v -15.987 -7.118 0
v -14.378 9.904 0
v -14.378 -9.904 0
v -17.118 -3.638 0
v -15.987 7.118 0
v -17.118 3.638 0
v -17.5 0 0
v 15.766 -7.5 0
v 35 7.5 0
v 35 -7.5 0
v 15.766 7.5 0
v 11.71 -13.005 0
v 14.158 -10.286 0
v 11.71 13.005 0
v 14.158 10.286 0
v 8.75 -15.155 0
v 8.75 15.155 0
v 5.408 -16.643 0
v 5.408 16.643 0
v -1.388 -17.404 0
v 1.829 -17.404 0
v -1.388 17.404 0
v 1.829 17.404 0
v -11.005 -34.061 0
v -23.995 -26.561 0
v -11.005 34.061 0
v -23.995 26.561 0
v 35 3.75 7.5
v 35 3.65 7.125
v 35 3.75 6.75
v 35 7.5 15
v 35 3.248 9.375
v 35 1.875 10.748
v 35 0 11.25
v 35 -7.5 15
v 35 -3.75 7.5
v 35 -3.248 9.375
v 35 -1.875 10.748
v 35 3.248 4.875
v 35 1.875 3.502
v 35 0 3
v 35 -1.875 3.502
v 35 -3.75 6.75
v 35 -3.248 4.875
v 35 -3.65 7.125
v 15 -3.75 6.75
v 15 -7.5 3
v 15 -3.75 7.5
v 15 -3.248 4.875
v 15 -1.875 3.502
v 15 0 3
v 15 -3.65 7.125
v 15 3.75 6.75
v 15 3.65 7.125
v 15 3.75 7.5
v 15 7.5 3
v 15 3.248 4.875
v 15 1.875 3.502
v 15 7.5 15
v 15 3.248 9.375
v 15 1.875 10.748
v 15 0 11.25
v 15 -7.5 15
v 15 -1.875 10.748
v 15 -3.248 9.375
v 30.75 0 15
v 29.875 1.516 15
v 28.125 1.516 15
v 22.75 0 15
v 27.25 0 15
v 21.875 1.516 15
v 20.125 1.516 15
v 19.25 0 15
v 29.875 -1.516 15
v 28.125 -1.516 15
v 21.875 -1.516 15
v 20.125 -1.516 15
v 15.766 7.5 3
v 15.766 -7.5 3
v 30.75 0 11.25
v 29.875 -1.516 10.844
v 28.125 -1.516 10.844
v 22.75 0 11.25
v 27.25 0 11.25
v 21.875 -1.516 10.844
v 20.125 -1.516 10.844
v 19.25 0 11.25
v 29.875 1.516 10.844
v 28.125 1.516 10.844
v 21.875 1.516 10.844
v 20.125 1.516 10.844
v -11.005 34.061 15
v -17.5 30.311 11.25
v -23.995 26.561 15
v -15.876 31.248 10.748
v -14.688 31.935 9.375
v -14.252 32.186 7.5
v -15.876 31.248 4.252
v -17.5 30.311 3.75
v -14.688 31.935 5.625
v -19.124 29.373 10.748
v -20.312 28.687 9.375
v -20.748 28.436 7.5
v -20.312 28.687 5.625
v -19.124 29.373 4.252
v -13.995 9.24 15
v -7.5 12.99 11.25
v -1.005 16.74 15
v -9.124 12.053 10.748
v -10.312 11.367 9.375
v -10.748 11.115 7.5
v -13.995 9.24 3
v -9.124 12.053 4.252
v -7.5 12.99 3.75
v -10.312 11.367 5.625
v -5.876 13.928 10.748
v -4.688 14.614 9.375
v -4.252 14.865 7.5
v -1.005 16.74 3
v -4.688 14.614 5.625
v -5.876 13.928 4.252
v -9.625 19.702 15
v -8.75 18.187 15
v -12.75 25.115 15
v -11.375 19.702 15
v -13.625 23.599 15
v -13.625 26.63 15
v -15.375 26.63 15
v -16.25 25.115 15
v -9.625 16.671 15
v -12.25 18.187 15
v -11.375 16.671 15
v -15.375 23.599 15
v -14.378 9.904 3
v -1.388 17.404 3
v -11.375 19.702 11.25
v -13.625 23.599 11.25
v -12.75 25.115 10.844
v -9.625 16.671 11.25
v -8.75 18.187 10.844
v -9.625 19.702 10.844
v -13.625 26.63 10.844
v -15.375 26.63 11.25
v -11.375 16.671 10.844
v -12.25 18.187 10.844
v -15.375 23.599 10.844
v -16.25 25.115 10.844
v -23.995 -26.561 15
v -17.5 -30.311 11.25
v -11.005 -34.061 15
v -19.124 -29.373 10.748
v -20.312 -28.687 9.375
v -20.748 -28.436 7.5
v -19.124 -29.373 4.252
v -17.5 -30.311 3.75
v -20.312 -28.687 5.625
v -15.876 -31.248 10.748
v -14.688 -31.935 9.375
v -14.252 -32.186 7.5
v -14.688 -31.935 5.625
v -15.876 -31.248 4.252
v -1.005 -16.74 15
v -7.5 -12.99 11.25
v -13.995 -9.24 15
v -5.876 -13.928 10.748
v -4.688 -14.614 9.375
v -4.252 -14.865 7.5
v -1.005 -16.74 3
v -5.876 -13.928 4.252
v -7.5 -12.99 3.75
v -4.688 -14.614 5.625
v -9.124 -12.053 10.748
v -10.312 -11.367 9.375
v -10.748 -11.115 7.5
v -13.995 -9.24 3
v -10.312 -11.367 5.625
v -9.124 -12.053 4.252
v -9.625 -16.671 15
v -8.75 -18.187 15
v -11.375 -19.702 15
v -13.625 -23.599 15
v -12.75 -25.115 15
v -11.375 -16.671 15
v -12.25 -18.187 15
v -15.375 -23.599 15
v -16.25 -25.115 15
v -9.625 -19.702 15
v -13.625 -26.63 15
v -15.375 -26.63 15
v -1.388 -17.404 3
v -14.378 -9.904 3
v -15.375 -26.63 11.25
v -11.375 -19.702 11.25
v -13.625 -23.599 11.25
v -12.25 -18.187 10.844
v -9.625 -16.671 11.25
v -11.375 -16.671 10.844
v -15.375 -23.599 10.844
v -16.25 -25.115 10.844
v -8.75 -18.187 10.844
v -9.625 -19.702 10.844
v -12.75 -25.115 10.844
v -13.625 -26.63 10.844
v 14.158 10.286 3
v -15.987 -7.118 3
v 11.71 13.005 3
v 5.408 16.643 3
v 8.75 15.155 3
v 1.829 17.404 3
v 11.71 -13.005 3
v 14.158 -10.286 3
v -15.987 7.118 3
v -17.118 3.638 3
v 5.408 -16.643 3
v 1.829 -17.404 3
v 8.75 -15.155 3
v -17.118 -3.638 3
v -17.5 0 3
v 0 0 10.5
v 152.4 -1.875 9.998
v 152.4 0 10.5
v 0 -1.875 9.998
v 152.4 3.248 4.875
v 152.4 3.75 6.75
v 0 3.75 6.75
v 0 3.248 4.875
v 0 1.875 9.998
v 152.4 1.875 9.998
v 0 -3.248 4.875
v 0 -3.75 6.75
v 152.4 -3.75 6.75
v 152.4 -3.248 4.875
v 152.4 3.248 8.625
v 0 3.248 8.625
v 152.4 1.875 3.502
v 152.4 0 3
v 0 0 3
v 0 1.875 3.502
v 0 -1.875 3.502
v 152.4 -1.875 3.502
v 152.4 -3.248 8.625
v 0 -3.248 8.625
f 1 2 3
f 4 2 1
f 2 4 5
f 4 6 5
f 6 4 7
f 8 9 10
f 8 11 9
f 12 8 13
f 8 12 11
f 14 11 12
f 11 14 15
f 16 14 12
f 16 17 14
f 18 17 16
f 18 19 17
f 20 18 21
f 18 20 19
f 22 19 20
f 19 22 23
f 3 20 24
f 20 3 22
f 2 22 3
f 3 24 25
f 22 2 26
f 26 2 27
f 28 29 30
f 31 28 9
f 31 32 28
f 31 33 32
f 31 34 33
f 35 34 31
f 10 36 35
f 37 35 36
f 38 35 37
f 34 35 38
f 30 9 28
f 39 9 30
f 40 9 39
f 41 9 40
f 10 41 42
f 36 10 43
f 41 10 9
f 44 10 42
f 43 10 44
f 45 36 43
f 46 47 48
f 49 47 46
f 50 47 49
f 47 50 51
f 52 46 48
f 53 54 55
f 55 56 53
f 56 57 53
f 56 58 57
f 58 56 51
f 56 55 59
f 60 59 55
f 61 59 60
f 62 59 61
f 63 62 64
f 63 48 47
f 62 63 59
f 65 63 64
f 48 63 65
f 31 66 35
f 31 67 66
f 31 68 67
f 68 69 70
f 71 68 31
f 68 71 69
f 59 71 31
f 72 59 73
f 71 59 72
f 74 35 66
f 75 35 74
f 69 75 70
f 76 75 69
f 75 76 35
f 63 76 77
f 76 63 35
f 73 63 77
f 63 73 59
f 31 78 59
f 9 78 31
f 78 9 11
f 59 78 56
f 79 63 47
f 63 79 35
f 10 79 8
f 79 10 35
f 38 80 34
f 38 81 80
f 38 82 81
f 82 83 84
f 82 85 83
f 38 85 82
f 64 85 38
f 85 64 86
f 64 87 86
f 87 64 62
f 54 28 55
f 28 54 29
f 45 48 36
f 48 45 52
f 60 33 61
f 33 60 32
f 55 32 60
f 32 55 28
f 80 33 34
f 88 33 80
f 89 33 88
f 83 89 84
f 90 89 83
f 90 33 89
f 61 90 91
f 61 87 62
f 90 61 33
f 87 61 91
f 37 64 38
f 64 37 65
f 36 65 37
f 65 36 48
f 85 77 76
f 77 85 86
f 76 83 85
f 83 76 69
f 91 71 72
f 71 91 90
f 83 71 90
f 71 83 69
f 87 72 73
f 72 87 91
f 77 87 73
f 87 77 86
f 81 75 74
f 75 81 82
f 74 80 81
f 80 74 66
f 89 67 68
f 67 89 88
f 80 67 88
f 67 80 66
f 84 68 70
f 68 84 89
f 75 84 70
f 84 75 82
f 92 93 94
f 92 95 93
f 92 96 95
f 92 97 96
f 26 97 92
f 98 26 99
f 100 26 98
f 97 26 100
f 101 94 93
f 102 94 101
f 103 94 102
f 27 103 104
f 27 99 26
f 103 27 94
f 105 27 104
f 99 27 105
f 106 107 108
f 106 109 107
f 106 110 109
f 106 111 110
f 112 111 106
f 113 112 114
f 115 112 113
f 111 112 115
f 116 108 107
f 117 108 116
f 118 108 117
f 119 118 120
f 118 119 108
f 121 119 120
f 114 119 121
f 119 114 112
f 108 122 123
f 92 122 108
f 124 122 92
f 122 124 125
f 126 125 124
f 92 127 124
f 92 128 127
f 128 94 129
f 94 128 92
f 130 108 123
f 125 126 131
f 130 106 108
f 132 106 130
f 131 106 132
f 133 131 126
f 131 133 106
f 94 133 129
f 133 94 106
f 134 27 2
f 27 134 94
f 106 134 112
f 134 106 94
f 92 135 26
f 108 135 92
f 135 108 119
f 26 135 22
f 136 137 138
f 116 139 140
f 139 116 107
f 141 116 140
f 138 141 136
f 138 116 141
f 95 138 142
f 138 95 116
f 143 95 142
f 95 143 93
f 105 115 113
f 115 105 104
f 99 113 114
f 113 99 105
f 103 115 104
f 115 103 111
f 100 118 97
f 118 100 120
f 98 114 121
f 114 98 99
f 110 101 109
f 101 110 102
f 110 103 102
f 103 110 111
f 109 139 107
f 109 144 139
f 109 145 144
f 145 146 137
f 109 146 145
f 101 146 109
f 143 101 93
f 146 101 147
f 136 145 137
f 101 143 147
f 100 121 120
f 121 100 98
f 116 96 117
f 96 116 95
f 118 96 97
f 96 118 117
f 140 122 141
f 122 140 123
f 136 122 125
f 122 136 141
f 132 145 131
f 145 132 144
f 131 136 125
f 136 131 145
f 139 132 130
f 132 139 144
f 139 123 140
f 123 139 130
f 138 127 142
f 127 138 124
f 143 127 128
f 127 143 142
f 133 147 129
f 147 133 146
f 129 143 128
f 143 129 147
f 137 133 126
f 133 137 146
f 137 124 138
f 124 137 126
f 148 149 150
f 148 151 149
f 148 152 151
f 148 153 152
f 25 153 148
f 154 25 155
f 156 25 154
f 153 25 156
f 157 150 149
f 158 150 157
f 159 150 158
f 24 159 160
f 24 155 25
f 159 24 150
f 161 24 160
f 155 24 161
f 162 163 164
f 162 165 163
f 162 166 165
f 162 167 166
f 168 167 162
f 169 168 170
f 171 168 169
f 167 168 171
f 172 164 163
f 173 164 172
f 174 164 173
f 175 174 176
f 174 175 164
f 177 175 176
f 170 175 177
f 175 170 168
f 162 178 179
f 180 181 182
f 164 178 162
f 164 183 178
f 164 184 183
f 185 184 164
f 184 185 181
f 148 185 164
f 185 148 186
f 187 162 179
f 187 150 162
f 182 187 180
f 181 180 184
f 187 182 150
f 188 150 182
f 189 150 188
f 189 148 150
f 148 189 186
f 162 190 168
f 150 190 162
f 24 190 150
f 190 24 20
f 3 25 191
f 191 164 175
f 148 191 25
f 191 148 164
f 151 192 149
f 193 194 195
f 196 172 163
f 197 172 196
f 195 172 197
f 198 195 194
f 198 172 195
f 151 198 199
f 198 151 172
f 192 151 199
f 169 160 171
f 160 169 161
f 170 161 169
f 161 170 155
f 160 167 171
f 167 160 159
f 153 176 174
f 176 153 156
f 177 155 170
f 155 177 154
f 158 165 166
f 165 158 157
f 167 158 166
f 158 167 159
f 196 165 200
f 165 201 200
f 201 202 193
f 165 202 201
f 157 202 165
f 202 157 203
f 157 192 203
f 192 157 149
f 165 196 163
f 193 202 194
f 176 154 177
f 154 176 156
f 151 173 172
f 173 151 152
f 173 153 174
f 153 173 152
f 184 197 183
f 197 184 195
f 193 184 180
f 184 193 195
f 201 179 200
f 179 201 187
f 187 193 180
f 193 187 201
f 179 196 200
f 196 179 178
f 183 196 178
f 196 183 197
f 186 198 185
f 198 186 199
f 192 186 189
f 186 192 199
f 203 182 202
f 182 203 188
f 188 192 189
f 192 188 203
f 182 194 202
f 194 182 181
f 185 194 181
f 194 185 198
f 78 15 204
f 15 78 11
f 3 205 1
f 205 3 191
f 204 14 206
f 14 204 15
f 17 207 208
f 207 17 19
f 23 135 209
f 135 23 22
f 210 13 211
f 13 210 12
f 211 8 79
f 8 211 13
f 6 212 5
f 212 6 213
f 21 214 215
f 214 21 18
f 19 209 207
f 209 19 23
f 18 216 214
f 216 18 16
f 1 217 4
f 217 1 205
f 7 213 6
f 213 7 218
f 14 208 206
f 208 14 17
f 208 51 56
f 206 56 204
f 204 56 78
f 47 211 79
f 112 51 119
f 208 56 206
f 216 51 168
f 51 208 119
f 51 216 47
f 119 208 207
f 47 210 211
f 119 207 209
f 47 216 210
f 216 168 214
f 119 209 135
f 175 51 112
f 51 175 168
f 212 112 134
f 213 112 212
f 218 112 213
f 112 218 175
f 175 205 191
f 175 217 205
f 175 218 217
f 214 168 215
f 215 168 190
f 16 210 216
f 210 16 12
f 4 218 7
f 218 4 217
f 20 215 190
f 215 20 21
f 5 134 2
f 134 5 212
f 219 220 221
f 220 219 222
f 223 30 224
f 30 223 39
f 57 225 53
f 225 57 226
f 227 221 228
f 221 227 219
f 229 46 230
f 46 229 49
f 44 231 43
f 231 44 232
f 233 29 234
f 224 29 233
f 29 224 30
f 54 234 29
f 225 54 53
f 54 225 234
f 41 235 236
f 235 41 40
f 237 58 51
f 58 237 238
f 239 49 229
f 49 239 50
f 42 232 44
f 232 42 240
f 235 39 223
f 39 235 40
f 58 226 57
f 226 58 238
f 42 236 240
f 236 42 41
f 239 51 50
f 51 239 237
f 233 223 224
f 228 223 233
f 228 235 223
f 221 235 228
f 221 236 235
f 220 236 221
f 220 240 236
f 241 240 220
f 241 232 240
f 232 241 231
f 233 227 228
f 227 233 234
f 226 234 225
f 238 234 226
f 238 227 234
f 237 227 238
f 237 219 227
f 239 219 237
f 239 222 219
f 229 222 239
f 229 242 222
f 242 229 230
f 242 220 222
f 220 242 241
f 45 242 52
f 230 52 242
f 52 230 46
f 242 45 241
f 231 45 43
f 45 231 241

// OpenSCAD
union() {
	cylinder(d = 35, h = 3);
	translate(v = [0, 0, 7.5000000000]) {
		translate(v = [25, 0, 0]) {
			difference() {
				rotate(a = [0, 90, 0]) {
					difference() {
						cube(center = true, size = [15, 15, 20]);
						translate(v = [0, 0, -20]) {
							cylinder(d = 7.5000000000, h = 40);
						}
					}
				}
				translate(v = [-4, 0, 0]) {
					cylinder(d = 3.5000000000, h = 10);
				}
				translate(v = [4, 0, 0]) {
					cylinder(d = 3.5000000000, h = 10);
				}
			}
		}
	}
	rotate(a = [0, 0, 120]) {
		translate(v = [0, 0, 7.5000000000]) {
			translate(v = [25, 0, 0]) {
				difference() {
					rotate(a = [0, 90, 0]) {
						difference() {
							cube(center = true, size = [15, 15, 20]);
							translate(v = [0, 0, -20]) {
								cylinder(d = 7.5000000000, h = 40);
							}
						}
					}
					translate(v = [-4, 0, 0]) {
						cylinder(d = 3.5000000000, h = 10);
					}
					translate(v = [4, 0, 0]) {
						cylinder(d = 3.5000000000, h = 10);
					}
				}
			}
		}
	}
	rotate(a = [0, 0, 240]) {
		translate(v = [0, 0, 7.5000000000]) {
			translate(v = [25, 0, 0]) {
				difference() {
					rotate(a = [0, 90, 0]) {
						difference() {
							cube(center = true, size = [15, 15, 20]);
							translate(v = [0, 0, -20]) {
								cylinder(d = 7.5000000000, h = 40);
							}
						}
					}
					translate(v = [-4, 0, 0]) {
						cylinder(d = 3.5000000000, h = 10);
					}
					translate(v = [4, 0, 0]) {
						cylinder(d = 3.5000000000, h = 10);
					}
				}
			}
		}
	}
	translate(v = [0, 0, 6.7500000000]) {
		rotate(a = [0, 90, 0]) {
			color(alpha = 1.0000000000, c = "brown") {
				cylinder(d = 7.5000000000, h = 152.4000000000);
			}
		}
	}
}
